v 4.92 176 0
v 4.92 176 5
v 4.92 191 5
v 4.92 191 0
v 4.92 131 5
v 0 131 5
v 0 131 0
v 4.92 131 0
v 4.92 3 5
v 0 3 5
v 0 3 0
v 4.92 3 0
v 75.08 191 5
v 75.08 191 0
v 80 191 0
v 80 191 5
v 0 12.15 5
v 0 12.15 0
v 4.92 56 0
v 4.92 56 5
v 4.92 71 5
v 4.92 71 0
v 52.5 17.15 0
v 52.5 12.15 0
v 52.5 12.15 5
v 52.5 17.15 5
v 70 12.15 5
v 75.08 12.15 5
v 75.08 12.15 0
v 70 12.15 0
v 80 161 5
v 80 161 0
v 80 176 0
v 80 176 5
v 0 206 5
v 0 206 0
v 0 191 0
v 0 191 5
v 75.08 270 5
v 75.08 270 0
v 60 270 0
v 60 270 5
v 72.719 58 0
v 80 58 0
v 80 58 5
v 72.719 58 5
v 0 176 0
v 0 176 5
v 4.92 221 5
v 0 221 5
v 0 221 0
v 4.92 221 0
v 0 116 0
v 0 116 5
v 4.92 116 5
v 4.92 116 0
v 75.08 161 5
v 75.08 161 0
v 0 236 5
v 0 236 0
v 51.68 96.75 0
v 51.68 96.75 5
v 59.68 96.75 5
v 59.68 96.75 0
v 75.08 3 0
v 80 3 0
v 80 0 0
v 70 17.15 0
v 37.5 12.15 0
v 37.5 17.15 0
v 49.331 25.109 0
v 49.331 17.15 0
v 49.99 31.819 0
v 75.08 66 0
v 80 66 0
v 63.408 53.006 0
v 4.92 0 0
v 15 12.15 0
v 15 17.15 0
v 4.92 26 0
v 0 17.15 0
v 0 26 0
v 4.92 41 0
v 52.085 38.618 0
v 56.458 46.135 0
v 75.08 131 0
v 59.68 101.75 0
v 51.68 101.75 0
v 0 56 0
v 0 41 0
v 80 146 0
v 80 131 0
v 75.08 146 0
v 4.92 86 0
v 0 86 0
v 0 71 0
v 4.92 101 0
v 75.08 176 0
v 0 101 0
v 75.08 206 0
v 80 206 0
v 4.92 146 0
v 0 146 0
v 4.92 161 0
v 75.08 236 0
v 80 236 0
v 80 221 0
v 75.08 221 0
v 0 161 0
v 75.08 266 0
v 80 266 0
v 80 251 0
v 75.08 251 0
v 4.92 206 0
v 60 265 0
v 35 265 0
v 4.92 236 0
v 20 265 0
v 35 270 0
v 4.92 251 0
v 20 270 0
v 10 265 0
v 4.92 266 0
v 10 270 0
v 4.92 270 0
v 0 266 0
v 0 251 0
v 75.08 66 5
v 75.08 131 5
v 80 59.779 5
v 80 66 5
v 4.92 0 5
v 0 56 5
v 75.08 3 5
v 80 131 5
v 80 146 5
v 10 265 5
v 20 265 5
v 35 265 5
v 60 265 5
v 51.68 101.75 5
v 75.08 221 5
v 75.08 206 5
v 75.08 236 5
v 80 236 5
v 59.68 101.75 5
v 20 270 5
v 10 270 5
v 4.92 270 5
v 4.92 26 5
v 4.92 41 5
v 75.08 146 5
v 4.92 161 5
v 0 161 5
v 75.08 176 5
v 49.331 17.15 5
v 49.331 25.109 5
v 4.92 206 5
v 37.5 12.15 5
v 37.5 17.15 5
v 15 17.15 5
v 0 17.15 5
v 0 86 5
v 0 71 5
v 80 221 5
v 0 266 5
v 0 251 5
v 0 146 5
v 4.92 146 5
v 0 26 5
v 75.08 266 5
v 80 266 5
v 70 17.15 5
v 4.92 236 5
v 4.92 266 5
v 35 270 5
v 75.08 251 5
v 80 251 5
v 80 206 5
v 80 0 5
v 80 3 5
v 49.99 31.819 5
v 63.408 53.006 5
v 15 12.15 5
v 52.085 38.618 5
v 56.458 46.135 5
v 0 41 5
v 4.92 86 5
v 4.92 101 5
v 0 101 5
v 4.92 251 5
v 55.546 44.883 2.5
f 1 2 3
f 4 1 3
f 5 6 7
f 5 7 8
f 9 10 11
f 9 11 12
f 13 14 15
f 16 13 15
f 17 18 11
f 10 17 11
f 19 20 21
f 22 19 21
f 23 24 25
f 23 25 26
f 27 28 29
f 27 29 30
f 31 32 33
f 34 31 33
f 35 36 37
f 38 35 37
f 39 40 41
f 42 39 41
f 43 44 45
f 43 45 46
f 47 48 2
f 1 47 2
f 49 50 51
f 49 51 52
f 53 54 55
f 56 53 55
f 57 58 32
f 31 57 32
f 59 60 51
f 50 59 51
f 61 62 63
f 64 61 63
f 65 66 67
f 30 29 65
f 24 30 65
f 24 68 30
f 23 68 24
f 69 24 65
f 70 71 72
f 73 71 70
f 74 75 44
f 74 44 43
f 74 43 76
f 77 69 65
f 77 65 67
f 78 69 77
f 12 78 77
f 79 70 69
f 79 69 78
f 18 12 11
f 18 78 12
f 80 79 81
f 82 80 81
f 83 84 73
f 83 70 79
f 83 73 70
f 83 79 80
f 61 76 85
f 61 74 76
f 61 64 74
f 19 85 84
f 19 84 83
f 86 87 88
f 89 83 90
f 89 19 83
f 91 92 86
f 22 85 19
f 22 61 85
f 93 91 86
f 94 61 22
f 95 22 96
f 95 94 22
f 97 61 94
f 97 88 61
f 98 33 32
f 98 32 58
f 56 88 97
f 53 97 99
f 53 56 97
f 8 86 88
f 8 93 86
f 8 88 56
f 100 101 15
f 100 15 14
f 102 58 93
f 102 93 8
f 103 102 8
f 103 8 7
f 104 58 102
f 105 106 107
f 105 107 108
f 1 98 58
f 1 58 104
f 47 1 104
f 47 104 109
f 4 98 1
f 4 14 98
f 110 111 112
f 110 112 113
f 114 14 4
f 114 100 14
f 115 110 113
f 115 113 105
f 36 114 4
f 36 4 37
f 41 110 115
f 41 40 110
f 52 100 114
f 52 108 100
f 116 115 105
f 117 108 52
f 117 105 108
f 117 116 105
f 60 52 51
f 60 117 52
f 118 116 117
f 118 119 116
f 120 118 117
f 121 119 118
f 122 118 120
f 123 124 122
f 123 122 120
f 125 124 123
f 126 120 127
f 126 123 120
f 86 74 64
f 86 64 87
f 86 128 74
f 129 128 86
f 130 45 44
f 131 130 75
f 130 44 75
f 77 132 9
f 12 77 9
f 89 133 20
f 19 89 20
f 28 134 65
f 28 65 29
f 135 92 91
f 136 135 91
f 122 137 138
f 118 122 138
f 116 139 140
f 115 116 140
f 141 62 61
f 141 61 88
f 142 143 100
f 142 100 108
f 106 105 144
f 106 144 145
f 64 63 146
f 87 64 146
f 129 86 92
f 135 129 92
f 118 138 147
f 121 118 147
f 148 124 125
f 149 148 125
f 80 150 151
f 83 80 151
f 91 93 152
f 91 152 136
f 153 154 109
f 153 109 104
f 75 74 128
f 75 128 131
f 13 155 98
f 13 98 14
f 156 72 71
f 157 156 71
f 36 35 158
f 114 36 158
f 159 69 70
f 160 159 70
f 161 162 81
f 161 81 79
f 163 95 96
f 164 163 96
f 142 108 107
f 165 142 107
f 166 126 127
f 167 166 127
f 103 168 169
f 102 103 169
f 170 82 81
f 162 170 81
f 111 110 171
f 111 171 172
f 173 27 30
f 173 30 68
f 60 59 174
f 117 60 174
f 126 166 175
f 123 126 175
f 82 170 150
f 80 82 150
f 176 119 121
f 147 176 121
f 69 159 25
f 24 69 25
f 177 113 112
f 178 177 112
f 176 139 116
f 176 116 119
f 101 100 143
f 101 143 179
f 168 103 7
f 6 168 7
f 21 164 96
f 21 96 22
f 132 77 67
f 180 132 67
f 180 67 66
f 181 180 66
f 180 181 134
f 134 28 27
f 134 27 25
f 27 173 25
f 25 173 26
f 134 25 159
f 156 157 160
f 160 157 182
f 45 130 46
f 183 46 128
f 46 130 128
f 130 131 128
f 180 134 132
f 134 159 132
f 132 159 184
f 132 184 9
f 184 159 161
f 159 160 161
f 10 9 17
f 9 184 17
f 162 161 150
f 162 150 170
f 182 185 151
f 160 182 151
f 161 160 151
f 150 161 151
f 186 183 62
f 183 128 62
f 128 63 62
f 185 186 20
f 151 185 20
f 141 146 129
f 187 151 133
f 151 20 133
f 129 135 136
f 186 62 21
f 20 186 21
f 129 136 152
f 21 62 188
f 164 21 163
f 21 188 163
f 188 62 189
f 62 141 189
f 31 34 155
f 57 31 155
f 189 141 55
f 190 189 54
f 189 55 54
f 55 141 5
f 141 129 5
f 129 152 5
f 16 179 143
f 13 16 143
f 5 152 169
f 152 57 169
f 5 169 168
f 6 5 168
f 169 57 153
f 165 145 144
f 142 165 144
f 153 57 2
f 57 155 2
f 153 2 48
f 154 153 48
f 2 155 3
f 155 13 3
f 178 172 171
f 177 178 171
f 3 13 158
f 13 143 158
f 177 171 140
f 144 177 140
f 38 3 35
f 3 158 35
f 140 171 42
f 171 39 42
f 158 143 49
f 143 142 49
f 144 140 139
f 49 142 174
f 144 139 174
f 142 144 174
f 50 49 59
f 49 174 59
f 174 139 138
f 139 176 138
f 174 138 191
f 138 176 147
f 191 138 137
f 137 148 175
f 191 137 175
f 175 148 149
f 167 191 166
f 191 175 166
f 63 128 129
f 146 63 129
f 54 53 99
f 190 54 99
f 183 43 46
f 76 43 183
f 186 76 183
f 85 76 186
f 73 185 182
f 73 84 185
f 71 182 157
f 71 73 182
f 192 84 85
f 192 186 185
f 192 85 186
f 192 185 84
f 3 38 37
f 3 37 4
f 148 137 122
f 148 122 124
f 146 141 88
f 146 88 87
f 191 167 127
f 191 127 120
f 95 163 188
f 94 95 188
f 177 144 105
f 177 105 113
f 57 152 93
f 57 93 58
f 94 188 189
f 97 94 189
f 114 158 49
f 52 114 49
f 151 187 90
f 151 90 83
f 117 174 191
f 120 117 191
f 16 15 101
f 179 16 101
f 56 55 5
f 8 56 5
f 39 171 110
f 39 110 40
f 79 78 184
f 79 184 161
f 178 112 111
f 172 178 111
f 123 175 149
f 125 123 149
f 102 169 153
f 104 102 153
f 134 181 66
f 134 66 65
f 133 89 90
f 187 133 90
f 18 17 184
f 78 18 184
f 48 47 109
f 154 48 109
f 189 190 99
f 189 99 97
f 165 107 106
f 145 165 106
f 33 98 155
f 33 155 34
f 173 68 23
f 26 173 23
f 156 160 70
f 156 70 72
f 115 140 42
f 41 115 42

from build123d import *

# Parameters (mm, degrees)
BOSS_EXTRU_1_DEPTH      = 5
ESQUISSE2_W             = 8
ESQUISSE2_H             = 5
ESQUISSE2_W_2           = 15
ESQUISSE2_W_3           = 4.92
ESQUISSE2_H_2           = 65
ESQUISSE2_H_3           = 3
ESQUISSE2_H_4           = 15
ESQUISSE2_W_4           = 10
ESQUISSE2_W_5           = 25
ENL_V_MAT_EXTRU_1_DEPTH = 5
ESQUISSE3_W             = 7.280585373
ESQUISSE3_H             = 3.947256303
BOSS_EXTRU_2_DEPTH      = 5


with BuildPart() as part:
    # Esquisse1 → Boss.-Extru.1 (new body)
    with BuildSketch(Plane.XY):
        with BuildLine():
            Line((0, 0), (80, 0))
            Line((80, 0), (80, 17.15))
            Line((80, 17.15), (49.330858803, 17.15))
            Line((49.330858803, 17.15), (49.330858803, 25.109342079))
            add(Edge.make_bspline(
                [(80, 59.779072791), (49.330858803, 55.600211761), (49.330858803, 25.109342079)],
                knots=[1.708281914, 1.708281914, 1.708281914, 3.141592654, 3.141592654, 3.141592654], degree=2, weights=[1, 0.754006918, 1]))
            Line((80, 59.779072791), (80, 270))
            Line((80, 270), (0, 270))
            Line((0, 270), (0, 0))
        make_face()
    extrude(amount=BOSS_EXTRU_1_DEPTH)

    # Esquisse2 → Enlèv. mat.-Extru.1 (cut)
    with BuildSketch(Plane.XY.offset(5)):
        with Locations((55.679721659, 99.250434868)):
            Rectangle(ESQUISSE2_W, ESQUISSE2_H)
        Polygon((75.08, 12.15), (70, 12.15), (70, 17.15), (80, 17.15), (80, 3), (75.08, 3), align=None)
        with Locations((45, 14.65)):
            Rectangle(ESQUISSE2_W_2, ESQUISSE2_H)
        with Locations((7.5, 14.65)):
            Rectangle(ESQUISSE2_W_2, ESQUISSE2_H)
        with Locations((77.54, 98.5)):
            Rectangle(ESQUISSE2_W_3, ESQUISSE2_H_2)
        with Locations((2.46, 1.5)):
            Rectangle(ESQUISSE2_W_3, ESQUISSE2_H_3)
        with Locations((77.54, 183.5)):
            Rectangle(ESQUISSE2_W_3, ESQUISSE2_H_4)
        with Locations((77.54, 153.5)):
            Rectangle(ESQUISSE2_W_3, ESQUISSE2_H_4)
        with Locations((77.54, 213.5)):
            Rectangle(ESQUISSE2_W_3, ESQUISSE2_H_4)
        with Locations((77.54, 243.5)):
            Rectangle(ESQUISSE2_W_3, ESQUISSE2_H_4)
        with Locations((77.54, 273.5)):
            Rectangle(ESQUISSE2_W_3, ESQUISSE2_H_4)
        with Locations((2.46, 273.5)):
            Rectangle(ESQUISSE2_W_3, ESQUISSE2_H_4)
        with Locations((2.46, 243.5)):
            Rectangle(ESQUISSE2_W_3, ESQUISSE2_H_4)
        with Locations((2.46, 213.5)):
            Rectangle(ESQUISSE2_W_3, ESQUISSE2_H_4)
        with Locations((2.46, 183.5)):
            Rectangle(ESQUISSE2_W_3, ESQUISSE2_H_4)
        with Locations((2.46, 153.5)):
            Rectangle(ESQUISSE2_W_3, ESQUISSE2_H_4)
        with Locations((2.46, 123.5)):
            Rectangle(ESQUISSE2_W_3, ESQUISSE2_H_4)
        with Locations((2.46, 93.5)):
            Rectangle(ESQUISSE2_W_3, ESQUISSE2_H_4)
        with Locations((2.46, 63.5)):
            Rectangle(ESQUISSE2_W_3, ESQUISSE2_H_4)
        with Locations((2.46, 33.5)):
            Rectangle(ESQUISSE2_W_3, ESQUISSE2_H_4)
        with Locations((15, 267.5)):
            Rectangle(ESQUISSE2_W_4, ESQUISSE2_H)
        with Locations((47.5, 267.5)):
            Rectangle(ESQUISSE2_W_5, ESQUISSE2_H)
    extrude(amount=-ENL_V_MAT_EXTRU_1_DEPTH, mode=Mode.SUBTRACT)

    # Esquisse3 → Boss.-Extru.2 (add)
    with BuildSketch(Plane(origin=(0, 0, 0), x_dir=(-1, 0, 0), z_dir=(0, 0, -1))):
        with Locations((-76.359707313, 59.973628152)):
            Rectangle(ESQUISSE3_W, ESQUISSE3_H)
    extrude(amount=-BOSS_EXTRU_2_DEPTH)


solid = part.part
